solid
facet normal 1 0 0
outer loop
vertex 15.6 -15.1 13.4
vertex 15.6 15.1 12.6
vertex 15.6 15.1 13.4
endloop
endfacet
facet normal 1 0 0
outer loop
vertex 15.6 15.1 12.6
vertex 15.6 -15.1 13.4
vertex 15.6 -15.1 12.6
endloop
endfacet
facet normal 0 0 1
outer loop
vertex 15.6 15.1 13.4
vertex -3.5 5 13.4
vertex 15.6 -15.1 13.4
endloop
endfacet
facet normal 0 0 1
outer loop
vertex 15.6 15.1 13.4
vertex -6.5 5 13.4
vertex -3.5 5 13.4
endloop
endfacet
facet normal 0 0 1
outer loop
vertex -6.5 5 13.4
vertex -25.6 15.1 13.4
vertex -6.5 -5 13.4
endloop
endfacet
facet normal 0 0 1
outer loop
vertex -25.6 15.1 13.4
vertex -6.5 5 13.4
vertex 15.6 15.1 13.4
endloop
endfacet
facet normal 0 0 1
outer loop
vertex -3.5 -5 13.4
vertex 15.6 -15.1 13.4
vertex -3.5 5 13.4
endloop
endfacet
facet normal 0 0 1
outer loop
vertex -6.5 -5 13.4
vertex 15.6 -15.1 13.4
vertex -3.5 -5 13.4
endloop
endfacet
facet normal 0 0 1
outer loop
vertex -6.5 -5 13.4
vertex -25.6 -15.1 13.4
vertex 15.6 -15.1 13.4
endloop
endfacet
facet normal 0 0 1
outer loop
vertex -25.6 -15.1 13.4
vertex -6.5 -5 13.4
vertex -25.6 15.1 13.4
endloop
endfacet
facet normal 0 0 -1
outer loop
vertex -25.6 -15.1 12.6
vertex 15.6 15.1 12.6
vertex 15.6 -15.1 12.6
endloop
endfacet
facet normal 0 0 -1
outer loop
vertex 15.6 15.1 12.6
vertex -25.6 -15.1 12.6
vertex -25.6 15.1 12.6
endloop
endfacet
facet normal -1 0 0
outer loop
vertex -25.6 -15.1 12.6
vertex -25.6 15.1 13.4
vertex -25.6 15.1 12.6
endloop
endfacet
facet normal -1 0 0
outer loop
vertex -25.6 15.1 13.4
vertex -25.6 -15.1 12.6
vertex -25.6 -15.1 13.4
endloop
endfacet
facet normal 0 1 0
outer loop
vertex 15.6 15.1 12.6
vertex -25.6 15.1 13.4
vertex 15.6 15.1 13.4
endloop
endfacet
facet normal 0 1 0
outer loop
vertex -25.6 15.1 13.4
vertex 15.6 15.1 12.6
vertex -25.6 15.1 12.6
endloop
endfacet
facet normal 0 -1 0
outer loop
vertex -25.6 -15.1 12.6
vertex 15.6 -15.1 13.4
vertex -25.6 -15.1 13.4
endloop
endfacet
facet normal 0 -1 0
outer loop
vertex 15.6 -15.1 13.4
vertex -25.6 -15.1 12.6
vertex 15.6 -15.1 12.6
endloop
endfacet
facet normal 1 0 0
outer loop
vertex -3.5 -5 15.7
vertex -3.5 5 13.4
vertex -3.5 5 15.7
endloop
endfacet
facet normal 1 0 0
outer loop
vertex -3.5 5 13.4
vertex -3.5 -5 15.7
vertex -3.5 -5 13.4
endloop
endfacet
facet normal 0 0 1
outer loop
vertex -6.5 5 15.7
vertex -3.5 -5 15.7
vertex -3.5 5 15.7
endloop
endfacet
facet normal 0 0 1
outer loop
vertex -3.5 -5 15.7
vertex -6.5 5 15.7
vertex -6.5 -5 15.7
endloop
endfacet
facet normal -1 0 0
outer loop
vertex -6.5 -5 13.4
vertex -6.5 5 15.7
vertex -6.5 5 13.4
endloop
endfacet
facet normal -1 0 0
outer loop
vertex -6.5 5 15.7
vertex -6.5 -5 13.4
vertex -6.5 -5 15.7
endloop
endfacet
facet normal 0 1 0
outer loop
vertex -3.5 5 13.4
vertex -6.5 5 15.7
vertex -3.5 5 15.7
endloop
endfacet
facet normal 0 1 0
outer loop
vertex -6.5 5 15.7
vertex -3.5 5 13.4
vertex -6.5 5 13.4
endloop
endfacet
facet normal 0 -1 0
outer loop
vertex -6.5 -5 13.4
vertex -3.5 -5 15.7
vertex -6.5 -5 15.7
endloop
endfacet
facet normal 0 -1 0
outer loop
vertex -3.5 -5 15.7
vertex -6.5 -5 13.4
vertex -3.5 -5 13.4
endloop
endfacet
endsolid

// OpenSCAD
// based on https://github.com/grapeot/alexa-esp32-cam/blob/master/Case.scad

total_size = [ 50, 29, 13 ];
wall_depth = [ 2, 2, 2 ];
slider_gap_depth = 1;
epsilon = 0.01;
margin = 0.8;

module case(camera_hole=true, usb_hole=true) {
    $fn=100;

    // cube body
    translate([0, 0, (total_size[2] + wall_depth[2]) / 2])
    rotate([180, 0, 0])
    difference() {
        cube(total_size + wall_depth * 2, center=true);
        // center hole
        cube(total_size, center=true);
        // slider gap
        translate([ wall_depth[0] / 2 + epsilon / 2, 0, -total_size[2] / 2 + wall_depth[2] / 2 + epsilon / 2 ])
        cube([ total_size[0] + wall_depth[0] + epsilon, total_size[1] + 2 * slider_gap_depth + epsilon, slider_gap_depth ], center=true);
        // remove the bottom 
        translate([ 0, 0, -total_size[2] / 2 - wall_depth[2] / 2 - epsilon ])
        cube([ total_size[0], total_size[1], wall_depth[2] + 3 * epsilon], center=true);
        // remove the edge which might cause the bridging issue
        translate([ total_size[0] / 2 + wall_depth[0] / 2 + epsilon / 2, 0, -total_size[2] / 2 - wall_depth[2] / 2 - epsilon ])
        cube([ wall_depth[0] + 2 * epsilon, total_size[1] + epsilon, wall_depth[2] * 2 + 3 * epsilon], center=true);
        // remove the hole for the micro USB
        if (usb_hole)
          translate([-total_size[0] / 2, 0, -5])
           cube([10, 13, 7], center=true);
        // remove the hole for the camera
        if (camera_hole)
          translate([10, 0, (total_size[2] + wall_depth[2]) / 2]) 
            cube([8.5, 8.5, 10], center=true);
        else
          // if no camera hole, remove a small bit to pass only the cable (externally placed camera)
          translate([10, 0, (total_size[2] + wall_depth[2]) / 2]) 
            cube([3, 17, 10], center=true);


    }
}

module slider() {
    // slider
    union() {
        cube([ total_size[0] + wall_depth[0] - margin - 10, total_size[1] + 2 * slider_gap_depth - margin, slider_gap_depth - 0.2 ], center=true);
        translate([0,0, 1.2]) cube([3, 10, 3], center=true);
    }
}

//case(false, false);
translate([ -5, 0, 13 ]) slider();
